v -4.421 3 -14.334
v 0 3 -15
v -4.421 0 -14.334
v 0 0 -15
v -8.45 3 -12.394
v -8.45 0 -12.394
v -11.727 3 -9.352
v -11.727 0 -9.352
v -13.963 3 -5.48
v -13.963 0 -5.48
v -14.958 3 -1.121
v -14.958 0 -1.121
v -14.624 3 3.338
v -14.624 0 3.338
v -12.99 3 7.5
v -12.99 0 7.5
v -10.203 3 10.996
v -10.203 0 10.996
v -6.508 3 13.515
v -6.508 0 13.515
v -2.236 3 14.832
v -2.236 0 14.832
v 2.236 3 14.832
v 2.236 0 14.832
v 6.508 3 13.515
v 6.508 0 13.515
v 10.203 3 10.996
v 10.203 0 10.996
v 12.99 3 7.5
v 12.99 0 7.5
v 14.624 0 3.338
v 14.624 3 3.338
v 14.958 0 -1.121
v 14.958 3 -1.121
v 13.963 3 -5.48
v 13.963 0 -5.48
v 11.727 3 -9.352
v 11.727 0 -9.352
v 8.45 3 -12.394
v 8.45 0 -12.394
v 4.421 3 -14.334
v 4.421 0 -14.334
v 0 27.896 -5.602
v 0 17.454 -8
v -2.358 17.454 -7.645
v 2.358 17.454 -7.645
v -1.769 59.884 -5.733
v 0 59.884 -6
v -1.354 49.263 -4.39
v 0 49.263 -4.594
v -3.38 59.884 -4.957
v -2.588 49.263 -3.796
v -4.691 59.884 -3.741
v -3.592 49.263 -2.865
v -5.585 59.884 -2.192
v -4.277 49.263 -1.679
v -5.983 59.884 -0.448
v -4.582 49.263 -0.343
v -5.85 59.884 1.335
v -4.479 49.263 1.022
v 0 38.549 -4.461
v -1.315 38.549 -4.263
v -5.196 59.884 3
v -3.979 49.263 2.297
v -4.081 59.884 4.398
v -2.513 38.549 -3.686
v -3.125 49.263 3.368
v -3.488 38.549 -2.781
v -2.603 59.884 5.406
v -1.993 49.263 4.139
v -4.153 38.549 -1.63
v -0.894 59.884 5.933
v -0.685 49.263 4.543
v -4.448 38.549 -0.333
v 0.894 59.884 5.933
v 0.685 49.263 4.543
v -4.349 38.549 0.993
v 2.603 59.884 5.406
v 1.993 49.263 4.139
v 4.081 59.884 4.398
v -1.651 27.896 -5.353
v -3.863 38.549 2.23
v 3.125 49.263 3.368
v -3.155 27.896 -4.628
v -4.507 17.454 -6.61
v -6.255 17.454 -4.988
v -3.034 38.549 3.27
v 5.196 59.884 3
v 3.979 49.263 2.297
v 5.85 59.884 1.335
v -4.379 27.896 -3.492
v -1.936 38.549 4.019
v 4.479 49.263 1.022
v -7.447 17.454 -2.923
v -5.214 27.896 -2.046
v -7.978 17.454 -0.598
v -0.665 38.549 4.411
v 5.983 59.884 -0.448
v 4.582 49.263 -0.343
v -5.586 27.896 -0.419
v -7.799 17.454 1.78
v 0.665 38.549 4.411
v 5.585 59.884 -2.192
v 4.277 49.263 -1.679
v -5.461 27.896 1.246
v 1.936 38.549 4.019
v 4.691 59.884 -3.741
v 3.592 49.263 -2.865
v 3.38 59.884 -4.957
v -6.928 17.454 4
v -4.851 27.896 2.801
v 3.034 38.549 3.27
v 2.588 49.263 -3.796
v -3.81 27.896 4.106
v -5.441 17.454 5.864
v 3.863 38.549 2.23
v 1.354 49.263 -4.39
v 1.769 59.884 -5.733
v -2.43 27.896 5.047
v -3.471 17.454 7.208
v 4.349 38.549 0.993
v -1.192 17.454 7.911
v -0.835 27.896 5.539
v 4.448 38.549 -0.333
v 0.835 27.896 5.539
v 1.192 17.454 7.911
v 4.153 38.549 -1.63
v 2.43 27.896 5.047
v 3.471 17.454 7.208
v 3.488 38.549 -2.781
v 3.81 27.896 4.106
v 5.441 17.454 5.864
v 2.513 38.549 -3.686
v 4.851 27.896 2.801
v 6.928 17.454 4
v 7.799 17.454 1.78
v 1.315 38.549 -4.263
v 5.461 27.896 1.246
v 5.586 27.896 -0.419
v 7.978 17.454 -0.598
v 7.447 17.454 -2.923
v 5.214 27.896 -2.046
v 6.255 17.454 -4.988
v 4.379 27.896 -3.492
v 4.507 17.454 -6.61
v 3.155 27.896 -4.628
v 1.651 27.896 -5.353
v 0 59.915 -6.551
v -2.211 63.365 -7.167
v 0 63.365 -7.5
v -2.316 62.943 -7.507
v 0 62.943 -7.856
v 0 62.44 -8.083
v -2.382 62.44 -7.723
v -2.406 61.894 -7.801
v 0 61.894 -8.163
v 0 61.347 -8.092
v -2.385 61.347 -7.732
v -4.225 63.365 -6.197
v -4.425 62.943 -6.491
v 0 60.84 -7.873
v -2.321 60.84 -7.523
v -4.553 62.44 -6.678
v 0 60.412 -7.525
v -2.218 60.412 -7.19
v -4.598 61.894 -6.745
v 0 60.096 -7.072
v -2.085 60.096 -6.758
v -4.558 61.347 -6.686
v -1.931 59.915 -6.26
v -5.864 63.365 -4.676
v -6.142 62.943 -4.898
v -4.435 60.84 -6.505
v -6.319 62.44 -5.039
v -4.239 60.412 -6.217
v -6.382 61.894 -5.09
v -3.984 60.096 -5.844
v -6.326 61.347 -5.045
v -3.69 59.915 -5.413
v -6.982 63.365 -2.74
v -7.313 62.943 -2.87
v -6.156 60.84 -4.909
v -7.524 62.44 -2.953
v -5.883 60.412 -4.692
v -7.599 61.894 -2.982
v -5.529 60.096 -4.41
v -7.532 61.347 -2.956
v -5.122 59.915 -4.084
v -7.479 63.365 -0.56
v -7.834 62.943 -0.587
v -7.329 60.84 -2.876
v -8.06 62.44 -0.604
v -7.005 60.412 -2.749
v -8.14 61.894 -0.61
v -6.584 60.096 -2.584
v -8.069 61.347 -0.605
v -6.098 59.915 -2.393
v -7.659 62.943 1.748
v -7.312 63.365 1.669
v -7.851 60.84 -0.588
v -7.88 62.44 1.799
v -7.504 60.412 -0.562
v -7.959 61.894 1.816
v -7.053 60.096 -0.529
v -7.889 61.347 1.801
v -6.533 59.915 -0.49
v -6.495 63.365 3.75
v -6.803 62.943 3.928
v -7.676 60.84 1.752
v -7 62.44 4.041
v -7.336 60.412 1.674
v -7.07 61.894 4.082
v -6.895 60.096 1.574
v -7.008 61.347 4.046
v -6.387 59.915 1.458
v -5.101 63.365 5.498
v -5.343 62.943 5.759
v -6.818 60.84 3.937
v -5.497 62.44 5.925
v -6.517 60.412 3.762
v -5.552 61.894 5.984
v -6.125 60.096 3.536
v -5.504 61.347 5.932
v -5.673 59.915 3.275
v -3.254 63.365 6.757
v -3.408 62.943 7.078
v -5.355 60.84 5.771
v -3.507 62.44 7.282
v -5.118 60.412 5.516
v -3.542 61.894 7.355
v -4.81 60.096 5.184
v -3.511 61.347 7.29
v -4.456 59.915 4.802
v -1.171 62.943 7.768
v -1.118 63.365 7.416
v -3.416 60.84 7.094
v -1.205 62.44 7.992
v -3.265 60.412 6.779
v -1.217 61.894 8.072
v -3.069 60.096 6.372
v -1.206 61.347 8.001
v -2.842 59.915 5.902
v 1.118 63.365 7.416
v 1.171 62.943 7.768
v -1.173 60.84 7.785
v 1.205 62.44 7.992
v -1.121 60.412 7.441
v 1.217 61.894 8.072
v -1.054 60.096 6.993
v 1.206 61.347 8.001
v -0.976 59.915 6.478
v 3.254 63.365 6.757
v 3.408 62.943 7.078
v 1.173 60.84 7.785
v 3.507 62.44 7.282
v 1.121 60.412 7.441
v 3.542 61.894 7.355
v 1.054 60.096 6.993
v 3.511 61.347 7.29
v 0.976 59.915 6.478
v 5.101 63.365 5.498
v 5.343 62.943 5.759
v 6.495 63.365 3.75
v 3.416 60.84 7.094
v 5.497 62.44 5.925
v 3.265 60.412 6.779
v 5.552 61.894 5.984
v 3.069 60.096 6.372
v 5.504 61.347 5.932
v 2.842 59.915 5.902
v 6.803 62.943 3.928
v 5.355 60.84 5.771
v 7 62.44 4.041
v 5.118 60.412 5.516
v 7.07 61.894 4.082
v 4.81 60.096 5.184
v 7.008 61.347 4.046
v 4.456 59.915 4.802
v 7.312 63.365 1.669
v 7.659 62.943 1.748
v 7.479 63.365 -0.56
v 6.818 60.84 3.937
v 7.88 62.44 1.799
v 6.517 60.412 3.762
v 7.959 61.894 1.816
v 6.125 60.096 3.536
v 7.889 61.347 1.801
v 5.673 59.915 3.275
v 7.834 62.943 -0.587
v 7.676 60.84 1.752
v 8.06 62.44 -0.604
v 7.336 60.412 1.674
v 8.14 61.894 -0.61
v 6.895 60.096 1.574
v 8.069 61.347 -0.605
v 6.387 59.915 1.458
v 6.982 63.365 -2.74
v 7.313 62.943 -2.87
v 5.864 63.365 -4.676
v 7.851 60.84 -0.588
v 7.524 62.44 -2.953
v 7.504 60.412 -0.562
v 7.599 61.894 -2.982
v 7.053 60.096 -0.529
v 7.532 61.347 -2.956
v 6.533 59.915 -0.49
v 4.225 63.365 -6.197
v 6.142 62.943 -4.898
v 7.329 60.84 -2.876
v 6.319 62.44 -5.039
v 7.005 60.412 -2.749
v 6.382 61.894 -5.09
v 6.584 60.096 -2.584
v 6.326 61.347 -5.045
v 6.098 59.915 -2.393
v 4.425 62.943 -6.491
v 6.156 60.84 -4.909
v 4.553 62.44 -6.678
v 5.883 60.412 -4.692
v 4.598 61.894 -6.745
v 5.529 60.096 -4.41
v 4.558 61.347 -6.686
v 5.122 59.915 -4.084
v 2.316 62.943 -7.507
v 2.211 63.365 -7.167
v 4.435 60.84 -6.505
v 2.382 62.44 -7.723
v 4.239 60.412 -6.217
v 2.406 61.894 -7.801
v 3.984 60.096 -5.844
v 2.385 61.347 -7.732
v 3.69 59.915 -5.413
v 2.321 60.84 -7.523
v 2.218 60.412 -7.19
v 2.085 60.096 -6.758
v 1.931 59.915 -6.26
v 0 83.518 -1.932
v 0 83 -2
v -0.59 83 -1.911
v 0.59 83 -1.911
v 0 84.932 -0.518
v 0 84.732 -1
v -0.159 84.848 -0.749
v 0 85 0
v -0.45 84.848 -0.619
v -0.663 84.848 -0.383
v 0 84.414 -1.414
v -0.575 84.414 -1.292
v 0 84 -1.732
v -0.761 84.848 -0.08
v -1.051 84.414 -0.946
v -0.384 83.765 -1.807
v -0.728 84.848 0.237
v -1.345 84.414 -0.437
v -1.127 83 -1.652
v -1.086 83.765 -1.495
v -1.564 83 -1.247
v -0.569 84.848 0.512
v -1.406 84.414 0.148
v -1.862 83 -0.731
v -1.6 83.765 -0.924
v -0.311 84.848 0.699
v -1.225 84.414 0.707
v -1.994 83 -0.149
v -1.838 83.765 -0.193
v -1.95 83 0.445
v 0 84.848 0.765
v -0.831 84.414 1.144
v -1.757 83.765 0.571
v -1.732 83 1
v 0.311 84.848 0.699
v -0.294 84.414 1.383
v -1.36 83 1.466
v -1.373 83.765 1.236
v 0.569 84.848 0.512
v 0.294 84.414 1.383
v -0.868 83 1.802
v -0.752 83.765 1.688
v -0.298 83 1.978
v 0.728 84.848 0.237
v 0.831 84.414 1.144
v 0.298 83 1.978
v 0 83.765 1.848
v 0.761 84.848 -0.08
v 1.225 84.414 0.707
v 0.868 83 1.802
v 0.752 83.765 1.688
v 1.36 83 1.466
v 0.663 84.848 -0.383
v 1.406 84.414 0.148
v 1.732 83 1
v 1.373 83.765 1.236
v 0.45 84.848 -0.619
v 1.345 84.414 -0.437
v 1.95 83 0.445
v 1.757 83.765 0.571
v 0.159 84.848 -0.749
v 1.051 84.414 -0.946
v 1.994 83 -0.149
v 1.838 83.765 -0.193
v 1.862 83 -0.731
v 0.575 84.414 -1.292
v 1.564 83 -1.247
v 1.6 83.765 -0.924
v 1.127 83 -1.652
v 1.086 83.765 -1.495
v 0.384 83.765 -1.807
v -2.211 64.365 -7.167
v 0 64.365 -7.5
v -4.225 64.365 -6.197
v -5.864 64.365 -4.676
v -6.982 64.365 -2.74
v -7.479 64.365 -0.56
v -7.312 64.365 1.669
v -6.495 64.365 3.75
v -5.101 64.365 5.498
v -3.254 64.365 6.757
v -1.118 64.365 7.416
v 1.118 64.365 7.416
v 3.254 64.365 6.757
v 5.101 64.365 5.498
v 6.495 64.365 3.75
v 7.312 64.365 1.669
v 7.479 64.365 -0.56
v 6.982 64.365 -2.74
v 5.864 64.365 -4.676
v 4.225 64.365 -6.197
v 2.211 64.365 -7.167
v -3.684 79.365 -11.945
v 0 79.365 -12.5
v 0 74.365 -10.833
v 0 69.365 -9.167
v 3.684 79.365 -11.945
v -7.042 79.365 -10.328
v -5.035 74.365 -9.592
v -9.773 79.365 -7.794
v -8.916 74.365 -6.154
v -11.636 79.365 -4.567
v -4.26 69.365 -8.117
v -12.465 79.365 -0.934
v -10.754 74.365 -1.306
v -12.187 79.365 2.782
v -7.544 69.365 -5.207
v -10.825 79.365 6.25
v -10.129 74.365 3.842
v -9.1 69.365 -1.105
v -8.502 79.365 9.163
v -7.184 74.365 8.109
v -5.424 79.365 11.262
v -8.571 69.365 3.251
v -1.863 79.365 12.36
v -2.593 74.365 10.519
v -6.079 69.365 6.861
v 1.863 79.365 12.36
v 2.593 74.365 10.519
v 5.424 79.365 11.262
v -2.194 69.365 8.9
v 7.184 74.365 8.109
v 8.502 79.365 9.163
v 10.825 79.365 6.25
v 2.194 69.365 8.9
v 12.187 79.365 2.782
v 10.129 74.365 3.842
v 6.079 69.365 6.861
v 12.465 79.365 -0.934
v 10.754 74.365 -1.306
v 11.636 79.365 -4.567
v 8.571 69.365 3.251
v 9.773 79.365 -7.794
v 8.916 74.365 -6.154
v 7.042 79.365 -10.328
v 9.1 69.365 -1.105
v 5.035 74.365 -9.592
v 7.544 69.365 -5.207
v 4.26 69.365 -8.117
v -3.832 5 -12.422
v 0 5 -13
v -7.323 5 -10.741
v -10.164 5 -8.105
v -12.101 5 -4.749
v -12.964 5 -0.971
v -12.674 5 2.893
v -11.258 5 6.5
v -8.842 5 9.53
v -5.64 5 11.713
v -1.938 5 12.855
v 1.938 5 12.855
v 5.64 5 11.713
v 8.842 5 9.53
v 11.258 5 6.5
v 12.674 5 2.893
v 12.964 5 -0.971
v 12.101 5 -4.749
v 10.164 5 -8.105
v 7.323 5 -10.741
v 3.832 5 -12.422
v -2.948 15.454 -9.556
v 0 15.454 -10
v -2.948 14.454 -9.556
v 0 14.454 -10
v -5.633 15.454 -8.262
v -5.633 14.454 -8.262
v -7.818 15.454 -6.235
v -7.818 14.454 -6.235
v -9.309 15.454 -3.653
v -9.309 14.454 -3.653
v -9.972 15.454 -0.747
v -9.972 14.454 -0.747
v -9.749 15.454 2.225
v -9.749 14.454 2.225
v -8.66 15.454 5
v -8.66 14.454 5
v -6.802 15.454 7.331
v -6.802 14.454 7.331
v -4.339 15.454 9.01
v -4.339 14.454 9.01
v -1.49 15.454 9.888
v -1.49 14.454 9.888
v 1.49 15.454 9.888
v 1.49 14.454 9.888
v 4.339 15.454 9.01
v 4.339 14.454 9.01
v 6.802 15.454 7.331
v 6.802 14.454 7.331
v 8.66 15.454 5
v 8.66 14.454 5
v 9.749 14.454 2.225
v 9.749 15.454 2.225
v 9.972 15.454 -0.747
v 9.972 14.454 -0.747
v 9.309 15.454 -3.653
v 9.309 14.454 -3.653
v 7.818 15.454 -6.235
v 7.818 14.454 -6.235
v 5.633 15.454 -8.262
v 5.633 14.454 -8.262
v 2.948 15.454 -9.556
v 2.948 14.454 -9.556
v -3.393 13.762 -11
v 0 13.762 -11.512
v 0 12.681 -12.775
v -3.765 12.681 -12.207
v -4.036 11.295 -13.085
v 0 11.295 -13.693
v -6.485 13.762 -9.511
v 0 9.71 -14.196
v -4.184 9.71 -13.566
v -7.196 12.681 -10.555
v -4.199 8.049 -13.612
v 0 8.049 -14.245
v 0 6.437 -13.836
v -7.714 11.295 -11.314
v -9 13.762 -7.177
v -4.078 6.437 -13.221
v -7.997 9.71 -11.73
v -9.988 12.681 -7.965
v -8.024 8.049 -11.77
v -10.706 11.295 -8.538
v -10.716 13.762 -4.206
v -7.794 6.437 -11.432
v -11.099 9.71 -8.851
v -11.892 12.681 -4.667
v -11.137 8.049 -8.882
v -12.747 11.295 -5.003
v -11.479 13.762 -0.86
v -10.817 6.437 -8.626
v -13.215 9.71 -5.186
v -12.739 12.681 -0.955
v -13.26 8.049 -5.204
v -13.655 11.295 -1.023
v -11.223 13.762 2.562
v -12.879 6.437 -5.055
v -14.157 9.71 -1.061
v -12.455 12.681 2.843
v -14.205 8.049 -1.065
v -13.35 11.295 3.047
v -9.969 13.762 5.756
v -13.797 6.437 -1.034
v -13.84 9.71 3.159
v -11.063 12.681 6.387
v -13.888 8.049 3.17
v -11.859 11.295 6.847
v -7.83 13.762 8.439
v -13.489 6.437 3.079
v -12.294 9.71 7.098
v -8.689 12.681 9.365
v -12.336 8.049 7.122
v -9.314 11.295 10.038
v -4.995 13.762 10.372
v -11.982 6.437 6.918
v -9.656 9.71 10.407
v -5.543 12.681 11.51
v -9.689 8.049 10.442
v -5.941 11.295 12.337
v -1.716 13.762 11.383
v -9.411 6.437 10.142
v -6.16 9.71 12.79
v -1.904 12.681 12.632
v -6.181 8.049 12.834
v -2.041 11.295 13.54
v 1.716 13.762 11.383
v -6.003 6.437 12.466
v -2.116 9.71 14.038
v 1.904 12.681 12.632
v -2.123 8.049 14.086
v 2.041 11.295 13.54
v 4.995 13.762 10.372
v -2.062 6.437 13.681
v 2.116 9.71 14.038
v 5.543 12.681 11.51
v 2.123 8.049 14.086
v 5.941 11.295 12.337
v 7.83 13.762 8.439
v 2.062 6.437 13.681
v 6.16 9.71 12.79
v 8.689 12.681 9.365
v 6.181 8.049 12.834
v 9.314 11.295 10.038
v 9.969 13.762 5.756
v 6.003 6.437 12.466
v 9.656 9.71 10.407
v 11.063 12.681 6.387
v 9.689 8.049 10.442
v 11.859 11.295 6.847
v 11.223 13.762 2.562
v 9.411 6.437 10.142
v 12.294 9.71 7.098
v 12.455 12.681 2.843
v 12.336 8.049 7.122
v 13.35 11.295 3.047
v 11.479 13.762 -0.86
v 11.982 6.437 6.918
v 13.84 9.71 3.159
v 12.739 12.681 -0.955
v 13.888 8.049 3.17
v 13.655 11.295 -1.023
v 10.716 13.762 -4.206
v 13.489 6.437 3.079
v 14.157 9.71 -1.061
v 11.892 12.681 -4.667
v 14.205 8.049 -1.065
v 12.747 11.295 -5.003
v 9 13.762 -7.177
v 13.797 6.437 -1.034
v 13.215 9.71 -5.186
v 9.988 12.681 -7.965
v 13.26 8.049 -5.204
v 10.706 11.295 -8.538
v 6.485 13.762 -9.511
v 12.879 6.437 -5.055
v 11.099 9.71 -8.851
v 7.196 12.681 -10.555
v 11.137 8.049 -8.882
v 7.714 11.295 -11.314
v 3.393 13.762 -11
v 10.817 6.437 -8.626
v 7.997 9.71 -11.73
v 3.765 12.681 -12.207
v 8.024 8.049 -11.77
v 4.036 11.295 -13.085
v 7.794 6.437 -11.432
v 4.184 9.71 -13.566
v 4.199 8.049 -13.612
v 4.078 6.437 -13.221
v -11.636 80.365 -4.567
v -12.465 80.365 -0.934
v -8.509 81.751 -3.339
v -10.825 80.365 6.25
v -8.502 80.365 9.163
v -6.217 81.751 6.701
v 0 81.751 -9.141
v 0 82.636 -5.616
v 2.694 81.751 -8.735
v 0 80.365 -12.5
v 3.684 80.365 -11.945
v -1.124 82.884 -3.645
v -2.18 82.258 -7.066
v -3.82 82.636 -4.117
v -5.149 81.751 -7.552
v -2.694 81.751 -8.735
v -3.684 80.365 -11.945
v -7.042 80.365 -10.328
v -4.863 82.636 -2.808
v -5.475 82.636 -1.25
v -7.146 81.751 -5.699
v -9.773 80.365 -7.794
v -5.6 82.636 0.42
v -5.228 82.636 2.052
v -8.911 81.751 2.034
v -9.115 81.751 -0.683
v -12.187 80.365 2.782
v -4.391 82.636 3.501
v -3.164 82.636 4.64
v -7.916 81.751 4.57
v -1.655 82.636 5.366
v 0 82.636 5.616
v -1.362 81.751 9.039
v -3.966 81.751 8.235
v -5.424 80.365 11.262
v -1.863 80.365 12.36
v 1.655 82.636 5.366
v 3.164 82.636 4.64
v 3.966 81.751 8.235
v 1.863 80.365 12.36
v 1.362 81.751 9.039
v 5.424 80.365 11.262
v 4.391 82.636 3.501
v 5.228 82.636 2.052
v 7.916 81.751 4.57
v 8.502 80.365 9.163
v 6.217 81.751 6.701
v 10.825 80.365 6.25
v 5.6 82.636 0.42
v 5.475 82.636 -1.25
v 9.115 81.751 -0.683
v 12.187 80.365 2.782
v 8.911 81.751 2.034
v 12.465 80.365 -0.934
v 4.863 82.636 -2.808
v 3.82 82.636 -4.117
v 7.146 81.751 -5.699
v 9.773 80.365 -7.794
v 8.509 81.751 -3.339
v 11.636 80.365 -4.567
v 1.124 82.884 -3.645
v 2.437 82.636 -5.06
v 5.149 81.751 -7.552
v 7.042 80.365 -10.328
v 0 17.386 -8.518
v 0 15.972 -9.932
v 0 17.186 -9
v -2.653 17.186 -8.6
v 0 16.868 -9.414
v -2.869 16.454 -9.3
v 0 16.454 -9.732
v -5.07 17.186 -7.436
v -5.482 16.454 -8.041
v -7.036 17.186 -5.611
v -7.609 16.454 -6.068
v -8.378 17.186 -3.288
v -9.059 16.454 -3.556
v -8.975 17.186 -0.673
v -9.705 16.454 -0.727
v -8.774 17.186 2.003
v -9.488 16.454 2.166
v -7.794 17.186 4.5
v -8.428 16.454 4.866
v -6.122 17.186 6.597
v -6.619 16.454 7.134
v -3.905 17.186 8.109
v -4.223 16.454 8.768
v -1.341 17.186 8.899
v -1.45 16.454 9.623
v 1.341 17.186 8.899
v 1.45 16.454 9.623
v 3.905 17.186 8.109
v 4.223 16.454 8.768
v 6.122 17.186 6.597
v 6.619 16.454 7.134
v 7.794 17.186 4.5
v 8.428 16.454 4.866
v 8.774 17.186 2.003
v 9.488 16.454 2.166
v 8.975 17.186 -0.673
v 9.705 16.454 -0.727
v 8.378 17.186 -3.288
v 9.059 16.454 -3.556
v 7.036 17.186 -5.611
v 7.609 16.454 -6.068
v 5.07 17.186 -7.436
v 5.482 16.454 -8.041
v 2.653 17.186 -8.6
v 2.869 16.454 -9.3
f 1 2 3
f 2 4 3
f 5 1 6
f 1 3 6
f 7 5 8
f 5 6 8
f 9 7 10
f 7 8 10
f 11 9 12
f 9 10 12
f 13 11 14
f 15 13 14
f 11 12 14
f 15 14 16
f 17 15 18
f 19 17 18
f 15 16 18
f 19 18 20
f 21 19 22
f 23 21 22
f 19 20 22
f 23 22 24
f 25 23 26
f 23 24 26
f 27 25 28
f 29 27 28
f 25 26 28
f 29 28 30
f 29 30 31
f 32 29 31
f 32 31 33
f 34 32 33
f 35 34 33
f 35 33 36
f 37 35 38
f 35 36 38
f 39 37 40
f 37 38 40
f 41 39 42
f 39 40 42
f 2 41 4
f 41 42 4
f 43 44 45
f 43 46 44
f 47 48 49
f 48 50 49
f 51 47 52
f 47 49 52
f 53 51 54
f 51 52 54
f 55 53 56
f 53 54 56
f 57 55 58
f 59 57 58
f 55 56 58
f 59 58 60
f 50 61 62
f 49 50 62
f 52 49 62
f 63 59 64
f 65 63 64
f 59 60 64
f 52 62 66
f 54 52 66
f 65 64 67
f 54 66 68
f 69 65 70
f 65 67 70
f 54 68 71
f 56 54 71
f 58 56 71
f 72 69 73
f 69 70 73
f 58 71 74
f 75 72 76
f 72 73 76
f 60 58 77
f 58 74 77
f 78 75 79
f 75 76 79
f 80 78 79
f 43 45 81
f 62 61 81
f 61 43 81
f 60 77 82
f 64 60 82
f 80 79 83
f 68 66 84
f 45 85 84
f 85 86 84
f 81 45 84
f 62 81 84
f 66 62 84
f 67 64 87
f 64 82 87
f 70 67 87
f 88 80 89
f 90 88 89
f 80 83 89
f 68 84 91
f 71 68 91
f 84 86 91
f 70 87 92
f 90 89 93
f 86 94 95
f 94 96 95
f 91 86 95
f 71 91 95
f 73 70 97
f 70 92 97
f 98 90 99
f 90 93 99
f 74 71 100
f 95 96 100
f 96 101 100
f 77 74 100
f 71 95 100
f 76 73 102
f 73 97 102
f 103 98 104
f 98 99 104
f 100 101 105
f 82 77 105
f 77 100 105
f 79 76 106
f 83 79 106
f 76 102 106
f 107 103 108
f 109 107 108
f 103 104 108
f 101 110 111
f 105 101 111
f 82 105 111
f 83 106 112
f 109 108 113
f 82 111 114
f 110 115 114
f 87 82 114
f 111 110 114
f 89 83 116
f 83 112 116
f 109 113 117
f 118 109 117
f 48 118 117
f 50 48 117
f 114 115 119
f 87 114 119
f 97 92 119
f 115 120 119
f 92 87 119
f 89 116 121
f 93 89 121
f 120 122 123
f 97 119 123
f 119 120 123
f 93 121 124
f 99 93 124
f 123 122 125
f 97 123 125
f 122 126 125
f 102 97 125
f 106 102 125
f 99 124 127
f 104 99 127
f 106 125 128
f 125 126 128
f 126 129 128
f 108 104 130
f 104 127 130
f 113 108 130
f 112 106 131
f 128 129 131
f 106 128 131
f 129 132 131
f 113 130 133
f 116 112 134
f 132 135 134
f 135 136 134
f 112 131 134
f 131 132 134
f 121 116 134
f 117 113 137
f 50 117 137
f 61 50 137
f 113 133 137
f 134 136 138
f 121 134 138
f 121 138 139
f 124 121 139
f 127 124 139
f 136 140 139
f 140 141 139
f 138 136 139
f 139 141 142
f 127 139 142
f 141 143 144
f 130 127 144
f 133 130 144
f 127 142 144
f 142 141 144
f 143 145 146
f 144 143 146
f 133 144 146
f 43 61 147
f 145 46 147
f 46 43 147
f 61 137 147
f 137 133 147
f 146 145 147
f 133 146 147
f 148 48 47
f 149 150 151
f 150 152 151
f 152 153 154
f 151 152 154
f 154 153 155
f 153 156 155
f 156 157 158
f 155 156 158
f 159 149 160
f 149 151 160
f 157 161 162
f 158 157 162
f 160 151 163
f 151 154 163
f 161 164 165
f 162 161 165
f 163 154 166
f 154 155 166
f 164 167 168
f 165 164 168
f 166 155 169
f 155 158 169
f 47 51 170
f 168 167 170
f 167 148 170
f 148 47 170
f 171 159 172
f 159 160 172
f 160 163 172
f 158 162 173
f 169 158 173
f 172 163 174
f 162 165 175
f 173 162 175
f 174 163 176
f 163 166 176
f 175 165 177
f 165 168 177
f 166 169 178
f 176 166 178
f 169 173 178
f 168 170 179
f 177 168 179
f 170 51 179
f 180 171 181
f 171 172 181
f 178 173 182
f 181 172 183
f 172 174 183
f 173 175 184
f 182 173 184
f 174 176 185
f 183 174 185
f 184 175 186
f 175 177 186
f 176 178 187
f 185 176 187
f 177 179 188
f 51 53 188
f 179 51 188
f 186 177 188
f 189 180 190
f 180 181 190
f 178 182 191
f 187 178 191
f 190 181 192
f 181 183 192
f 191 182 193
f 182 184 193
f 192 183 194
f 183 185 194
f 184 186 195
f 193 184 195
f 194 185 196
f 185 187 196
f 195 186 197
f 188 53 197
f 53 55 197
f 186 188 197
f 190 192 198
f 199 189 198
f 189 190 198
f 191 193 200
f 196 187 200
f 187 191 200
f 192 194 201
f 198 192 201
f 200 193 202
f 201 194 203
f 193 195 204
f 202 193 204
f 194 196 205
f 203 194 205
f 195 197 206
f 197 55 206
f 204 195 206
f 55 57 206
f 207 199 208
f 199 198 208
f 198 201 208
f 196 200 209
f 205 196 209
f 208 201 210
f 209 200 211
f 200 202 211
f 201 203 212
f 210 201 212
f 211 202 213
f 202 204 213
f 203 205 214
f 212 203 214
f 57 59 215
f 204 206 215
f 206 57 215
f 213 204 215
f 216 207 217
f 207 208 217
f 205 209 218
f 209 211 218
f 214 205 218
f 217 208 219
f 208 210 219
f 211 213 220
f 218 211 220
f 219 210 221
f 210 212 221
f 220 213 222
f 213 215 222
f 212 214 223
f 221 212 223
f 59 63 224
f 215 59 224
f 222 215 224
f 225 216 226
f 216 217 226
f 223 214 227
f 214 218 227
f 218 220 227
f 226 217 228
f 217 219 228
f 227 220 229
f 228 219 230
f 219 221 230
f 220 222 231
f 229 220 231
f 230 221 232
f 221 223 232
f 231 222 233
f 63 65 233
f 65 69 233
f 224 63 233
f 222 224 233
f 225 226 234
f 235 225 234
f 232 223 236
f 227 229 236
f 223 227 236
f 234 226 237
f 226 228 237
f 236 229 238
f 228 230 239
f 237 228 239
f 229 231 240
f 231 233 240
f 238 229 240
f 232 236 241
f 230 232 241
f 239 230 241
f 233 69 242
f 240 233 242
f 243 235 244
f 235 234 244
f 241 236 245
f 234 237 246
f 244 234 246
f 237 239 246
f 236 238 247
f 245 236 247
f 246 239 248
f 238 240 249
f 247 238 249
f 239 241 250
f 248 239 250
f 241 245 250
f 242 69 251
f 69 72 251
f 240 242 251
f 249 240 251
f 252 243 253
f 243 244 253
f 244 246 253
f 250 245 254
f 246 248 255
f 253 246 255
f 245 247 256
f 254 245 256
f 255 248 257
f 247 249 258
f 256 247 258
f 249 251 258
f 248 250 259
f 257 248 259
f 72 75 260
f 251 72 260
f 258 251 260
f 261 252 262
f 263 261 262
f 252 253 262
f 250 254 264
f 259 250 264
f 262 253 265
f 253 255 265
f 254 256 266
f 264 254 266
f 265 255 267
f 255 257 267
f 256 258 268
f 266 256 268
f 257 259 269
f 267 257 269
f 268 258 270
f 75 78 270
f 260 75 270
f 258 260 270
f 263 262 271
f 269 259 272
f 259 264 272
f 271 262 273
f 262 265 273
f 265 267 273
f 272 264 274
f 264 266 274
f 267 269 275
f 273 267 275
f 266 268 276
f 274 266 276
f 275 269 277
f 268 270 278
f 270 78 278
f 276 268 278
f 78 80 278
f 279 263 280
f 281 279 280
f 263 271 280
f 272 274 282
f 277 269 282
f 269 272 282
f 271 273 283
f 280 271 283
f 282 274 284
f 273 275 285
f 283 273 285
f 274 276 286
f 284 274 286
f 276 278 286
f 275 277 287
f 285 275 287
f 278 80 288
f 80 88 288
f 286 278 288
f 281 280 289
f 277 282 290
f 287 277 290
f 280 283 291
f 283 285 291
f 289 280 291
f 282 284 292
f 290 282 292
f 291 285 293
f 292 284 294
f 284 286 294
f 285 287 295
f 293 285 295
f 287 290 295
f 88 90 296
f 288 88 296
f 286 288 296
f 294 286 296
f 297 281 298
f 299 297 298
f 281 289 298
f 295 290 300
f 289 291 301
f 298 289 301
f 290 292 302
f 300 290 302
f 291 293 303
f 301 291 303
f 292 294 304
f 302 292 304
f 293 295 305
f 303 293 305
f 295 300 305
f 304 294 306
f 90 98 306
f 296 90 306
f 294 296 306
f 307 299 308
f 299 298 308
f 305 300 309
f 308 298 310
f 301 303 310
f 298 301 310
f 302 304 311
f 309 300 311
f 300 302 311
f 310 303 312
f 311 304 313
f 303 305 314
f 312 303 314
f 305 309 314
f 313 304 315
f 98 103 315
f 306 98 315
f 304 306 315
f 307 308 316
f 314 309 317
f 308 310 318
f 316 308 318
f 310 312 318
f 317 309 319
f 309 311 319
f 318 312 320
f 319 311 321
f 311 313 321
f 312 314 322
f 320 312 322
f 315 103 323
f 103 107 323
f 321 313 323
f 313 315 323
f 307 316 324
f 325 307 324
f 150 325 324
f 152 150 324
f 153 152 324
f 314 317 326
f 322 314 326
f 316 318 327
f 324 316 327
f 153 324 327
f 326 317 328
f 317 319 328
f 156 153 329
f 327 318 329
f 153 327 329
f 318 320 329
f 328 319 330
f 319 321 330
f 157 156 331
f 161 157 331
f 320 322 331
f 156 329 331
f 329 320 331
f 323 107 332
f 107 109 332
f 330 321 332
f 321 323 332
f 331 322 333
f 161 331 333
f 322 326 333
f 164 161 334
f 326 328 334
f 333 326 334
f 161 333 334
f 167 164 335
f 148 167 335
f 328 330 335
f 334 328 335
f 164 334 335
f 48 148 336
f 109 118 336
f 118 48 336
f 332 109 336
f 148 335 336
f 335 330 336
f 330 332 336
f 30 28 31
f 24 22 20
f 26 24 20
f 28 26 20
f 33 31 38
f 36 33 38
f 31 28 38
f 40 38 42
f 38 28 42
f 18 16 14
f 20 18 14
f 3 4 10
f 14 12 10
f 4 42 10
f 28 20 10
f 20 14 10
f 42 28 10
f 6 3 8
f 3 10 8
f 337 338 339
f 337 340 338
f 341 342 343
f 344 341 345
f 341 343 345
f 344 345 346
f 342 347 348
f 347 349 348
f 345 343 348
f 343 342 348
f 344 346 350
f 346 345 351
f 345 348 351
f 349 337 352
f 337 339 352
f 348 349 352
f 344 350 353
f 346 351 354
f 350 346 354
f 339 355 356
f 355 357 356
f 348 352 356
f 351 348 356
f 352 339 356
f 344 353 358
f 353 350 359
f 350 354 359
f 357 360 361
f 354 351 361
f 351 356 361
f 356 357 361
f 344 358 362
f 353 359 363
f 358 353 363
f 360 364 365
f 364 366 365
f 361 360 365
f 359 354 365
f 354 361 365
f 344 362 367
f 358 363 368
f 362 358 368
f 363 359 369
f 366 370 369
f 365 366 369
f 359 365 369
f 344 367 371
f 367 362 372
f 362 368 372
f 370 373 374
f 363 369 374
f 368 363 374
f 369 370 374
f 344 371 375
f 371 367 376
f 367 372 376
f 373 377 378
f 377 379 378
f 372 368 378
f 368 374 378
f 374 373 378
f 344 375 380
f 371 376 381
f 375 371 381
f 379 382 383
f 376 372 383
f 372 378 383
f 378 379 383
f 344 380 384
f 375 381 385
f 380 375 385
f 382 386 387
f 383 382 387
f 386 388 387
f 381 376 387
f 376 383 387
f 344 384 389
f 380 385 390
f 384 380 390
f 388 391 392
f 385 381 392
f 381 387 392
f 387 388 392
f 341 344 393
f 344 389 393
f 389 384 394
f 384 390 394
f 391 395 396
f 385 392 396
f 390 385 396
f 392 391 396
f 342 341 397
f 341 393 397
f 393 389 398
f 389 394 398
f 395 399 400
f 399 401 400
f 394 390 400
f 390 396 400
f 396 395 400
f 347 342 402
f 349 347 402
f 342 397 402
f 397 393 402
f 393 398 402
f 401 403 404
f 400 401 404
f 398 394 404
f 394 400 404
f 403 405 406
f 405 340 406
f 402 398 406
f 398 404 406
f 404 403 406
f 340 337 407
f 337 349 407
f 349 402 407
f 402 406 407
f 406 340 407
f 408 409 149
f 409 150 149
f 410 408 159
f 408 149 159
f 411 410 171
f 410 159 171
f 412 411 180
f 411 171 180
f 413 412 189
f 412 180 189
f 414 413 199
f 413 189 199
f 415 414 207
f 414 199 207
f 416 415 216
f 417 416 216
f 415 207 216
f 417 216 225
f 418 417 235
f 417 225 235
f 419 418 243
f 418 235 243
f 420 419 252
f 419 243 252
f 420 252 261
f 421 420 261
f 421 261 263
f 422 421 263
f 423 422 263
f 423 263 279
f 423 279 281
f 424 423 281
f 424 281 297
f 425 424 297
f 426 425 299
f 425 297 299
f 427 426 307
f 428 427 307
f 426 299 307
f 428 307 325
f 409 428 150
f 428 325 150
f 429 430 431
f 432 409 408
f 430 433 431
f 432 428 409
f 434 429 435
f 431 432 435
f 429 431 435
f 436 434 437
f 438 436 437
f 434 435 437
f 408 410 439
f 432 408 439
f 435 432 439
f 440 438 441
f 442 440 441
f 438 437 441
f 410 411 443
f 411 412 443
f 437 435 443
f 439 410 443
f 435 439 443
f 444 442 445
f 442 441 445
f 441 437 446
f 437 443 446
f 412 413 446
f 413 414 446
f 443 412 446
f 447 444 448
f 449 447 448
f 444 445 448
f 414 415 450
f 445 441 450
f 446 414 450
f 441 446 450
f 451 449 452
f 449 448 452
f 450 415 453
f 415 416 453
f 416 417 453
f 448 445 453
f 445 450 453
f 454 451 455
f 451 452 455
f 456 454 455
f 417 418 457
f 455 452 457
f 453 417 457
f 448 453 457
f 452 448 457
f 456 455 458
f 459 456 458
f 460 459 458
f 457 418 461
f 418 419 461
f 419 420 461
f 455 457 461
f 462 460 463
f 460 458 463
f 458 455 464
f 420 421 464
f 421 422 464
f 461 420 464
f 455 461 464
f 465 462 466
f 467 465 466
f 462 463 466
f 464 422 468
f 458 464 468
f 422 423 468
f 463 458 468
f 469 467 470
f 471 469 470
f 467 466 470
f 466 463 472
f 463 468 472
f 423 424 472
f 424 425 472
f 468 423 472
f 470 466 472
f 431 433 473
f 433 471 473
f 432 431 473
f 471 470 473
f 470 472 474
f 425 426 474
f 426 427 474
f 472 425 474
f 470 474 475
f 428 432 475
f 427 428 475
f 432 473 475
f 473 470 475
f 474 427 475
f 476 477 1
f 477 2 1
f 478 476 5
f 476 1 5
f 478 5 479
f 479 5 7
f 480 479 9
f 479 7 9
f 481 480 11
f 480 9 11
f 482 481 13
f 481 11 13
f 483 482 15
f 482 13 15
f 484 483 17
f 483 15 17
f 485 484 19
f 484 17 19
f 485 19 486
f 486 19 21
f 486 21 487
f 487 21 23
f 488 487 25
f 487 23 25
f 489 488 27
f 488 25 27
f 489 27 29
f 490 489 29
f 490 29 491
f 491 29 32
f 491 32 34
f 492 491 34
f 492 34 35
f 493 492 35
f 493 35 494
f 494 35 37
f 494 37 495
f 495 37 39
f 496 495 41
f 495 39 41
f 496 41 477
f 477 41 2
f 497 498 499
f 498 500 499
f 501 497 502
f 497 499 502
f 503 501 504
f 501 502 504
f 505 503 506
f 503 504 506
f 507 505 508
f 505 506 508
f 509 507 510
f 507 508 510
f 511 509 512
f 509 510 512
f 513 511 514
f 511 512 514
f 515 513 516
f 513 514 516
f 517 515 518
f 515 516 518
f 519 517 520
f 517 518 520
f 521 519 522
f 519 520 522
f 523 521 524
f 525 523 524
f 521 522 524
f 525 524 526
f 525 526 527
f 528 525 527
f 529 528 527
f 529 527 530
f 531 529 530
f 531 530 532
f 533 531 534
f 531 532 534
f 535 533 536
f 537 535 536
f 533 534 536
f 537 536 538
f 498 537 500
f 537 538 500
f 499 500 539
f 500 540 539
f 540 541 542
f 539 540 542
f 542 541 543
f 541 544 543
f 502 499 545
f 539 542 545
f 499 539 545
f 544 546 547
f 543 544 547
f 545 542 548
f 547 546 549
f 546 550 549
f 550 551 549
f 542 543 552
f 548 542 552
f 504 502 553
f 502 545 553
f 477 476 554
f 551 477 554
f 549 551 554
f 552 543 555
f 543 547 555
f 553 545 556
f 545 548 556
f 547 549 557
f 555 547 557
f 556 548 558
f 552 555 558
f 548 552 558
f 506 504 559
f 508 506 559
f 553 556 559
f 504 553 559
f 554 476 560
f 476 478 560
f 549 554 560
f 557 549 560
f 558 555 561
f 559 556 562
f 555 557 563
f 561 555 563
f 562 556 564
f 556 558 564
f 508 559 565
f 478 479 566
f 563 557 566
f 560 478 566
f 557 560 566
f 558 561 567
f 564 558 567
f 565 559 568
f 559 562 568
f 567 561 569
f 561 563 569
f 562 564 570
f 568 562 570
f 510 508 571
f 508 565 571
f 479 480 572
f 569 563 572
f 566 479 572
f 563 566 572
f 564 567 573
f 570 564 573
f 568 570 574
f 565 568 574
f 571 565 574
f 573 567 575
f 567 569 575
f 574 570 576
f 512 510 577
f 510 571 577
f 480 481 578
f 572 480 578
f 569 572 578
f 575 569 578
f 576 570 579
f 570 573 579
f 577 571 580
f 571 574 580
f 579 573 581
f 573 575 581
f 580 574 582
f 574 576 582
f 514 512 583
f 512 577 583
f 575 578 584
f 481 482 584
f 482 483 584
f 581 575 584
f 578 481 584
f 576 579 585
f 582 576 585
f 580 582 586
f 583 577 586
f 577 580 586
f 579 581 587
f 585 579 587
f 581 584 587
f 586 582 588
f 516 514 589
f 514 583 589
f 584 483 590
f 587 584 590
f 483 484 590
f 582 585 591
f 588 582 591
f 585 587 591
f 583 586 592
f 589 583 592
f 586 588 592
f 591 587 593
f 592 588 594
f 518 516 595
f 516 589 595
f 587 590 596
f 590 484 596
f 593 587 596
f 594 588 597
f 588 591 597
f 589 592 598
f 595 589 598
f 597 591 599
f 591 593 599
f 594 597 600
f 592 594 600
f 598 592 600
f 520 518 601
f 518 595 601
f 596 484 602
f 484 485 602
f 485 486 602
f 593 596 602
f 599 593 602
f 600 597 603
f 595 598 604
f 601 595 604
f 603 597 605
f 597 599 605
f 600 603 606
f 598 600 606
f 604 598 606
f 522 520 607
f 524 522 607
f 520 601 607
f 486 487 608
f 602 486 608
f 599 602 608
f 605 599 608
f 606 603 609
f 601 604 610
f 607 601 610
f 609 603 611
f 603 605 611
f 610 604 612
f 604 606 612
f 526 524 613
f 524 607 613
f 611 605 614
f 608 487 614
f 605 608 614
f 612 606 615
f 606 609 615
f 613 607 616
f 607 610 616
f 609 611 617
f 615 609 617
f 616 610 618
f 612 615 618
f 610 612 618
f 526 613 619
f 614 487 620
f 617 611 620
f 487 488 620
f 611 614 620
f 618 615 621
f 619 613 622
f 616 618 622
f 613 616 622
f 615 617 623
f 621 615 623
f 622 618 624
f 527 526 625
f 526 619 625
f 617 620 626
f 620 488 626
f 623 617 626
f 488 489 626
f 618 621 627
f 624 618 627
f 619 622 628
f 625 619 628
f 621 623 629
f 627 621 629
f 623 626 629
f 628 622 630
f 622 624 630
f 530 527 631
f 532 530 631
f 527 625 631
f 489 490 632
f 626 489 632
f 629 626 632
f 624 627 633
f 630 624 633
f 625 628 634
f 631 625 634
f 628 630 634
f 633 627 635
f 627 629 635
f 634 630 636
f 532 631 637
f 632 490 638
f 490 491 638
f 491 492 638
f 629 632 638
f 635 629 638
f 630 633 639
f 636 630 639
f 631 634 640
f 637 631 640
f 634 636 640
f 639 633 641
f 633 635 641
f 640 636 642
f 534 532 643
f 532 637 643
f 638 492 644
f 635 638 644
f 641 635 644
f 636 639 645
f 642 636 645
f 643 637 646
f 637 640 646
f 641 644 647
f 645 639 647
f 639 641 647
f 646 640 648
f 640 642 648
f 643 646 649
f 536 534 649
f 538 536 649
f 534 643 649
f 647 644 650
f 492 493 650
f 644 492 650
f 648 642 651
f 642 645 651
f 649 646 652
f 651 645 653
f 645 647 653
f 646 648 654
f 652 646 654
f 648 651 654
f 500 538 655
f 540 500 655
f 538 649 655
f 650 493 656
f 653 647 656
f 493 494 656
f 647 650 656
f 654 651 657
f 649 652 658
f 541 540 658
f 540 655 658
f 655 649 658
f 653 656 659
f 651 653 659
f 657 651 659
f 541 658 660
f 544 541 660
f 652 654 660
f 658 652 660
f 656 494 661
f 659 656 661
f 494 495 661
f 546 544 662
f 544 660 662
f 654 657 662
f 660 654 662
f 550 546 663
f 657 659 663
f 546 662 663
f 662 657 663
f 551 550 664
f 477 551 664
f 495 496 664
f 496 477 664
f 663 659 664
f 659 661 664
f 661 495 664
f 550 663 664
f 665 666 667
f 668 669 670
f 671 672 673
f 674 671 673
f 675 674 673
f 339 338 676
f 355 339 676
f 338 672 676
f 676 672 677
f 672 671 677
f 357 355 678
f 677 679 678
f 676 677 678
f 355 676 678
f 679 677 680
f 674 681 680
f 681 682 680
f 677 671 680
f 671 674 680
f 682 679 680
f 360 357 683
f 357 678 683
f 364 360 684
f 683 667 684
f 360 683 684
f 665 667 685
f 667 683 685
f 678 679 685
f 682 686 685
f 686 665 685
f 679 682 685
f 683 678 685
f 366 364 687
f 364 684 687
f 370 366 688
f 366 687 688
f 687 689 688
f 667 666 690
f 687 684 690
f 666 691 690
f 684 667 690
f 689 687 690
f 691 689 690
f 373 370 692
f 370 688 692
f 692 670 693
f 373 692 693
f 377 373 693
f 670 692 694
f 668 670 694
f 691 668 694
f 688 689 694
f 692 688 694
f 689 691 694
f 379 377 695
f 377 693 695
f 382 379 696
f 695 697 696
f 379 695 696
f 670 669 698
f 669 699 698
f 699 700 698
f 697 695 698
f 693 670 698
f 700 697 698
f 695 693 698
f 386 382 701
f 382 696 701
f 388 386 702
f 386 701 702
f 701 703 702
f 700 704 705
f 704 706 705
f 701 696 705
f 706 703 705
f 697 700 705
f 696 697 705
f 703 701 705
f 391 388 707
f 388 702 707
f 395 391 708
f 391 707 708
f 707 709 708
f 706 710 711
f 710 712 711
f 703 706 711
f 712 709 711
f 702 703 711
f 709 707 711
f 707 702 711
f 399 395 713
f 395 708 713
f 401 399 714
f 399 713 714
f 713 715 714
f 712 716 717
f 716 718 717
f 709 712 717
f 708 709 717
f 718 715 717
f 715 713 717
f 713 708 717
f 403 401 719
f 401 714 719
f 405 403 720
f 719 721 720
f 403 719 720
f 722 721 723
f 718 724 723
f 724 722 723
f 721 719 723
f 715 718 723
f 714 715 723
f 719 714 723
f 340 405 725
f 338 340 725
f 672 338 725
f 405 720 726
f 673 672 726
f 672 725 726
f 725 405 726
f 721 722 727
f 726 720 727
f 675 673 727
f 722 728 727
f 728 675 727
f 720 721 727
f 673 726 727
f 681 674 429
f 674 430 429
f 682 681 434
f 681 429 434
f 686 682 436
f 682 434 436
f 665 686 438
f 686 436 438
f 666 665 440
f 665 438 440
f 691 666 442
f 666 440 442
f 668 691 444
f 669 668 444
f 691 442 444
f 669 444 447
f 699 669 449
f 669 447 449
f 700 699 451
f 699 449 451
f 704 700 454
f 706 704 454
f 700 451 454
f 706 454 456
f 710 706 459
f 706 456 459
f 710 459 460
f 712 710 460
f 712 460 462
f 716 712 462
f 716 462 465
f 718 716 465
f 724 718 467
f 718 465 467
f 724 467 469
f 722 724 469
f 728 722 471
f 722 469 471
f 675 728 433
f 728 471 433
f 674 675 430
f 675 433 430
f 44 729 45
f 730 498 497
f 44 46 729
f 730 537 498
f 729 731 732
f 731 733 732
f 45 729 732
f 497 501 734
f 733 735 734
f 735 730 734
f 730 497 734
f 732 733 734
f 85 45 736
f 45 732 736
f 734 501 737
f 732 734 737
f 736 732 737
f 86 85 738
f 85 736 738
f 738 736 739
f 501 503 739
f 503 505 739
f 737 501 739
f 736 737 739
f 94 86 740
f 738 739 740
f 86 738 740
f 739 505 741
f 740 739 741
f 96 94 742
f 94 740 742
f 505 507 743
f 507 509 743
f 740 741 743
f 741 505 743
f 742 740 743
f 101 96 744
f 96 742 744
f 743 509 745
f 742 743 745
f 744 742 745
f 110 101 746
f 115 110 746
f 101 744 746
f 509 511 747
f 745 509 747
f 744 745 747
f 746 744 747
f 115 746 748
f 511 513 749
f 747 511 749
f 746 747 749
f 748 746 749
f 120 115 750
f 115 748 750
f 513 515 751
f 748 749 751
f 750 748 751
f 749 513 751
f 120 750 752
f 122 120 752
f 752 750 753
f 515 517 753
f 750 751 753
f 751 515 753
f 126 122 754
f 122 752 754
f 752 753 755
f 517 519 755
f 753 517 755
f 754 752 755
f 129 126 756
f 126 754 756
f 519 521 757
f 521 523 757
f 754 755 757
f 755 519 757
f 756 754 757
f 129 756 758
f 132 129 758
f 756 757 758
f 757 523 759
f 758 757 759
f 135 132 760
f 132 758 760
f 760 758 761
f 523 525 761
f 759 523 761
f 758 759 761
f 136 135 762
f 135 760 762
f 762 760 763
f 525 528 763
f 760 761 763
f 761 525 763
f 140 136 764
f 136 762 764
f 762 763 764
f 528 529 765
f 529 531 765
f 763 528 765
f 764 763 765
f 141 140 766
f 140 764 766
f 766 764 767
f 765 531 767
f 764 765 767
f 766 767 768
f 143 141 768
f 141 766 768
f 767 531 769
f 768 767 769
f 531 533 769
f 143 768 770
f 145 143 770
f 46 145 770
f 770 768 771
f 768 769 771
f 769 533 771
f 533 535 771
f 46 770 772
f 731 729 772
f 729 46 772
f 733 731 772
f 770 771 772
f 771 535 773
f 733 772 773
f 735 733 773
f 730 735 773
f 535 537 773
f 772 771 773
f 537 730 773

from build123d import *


with BuildPart() as part:
    # Sketch1 → Revolve1 (revolve)
    with BuildSketch(Plane.XY, mode=Mode.PRIVATE) as revolve1_sk:
        with BuildLine():
            Line((-15, 0), (0, 0))
            Line((0, 0), (0, 83))
            Line((0, 83), (-2, 83))
            ThreePointArc((-2, 83), (-7.394335397, 82.257693837), (-12.5, 80.365060283))
            Line((-12.5, 80.365060283), (-12.5, 79.365060283))
            Line((-12.5, 79.365060283), (-7.5, 64.365060283))
            Line((-7.5, 64.365060283), (-7.5, 63.365060283))
            ThreePointArc((-7.5, 63.365060283), (-8, 61.085924924), (-6, 59.884068865))
            ThreePointArc((-6, 59.884068865), (-4.460944967, 38.549386799), (-8, 17.454068865))
            ThreePointArc((-8, 17.454068865), (-9.414213562, 16.868282427), (-10, 15.454068865))
            Line((-10, 15.454068865), (-10, 14.454068865))
            ThreePointArc((-10, 14.454068865), (-14, 10.520343653), (-13, 5))
            Line((-13, 5), (-15, 3))
            Line((-15, 3), (-15, 0))
        make_face()
        with BuildLine():
            Line((-2, 83), (0, 83))
            Line((0, 83), (0, 85))
            ThreePointArc((0, 85), (-1.414213562, 84.414213562), (-2, 83))
        make_face()
    revolve(revolve1_sk.sketch.rotate(Axis((0, 0, 0), (0, 1, 0)), 270), axis=Axis((0, 0, 0), (0, 1, 0)))


solid = part.part
